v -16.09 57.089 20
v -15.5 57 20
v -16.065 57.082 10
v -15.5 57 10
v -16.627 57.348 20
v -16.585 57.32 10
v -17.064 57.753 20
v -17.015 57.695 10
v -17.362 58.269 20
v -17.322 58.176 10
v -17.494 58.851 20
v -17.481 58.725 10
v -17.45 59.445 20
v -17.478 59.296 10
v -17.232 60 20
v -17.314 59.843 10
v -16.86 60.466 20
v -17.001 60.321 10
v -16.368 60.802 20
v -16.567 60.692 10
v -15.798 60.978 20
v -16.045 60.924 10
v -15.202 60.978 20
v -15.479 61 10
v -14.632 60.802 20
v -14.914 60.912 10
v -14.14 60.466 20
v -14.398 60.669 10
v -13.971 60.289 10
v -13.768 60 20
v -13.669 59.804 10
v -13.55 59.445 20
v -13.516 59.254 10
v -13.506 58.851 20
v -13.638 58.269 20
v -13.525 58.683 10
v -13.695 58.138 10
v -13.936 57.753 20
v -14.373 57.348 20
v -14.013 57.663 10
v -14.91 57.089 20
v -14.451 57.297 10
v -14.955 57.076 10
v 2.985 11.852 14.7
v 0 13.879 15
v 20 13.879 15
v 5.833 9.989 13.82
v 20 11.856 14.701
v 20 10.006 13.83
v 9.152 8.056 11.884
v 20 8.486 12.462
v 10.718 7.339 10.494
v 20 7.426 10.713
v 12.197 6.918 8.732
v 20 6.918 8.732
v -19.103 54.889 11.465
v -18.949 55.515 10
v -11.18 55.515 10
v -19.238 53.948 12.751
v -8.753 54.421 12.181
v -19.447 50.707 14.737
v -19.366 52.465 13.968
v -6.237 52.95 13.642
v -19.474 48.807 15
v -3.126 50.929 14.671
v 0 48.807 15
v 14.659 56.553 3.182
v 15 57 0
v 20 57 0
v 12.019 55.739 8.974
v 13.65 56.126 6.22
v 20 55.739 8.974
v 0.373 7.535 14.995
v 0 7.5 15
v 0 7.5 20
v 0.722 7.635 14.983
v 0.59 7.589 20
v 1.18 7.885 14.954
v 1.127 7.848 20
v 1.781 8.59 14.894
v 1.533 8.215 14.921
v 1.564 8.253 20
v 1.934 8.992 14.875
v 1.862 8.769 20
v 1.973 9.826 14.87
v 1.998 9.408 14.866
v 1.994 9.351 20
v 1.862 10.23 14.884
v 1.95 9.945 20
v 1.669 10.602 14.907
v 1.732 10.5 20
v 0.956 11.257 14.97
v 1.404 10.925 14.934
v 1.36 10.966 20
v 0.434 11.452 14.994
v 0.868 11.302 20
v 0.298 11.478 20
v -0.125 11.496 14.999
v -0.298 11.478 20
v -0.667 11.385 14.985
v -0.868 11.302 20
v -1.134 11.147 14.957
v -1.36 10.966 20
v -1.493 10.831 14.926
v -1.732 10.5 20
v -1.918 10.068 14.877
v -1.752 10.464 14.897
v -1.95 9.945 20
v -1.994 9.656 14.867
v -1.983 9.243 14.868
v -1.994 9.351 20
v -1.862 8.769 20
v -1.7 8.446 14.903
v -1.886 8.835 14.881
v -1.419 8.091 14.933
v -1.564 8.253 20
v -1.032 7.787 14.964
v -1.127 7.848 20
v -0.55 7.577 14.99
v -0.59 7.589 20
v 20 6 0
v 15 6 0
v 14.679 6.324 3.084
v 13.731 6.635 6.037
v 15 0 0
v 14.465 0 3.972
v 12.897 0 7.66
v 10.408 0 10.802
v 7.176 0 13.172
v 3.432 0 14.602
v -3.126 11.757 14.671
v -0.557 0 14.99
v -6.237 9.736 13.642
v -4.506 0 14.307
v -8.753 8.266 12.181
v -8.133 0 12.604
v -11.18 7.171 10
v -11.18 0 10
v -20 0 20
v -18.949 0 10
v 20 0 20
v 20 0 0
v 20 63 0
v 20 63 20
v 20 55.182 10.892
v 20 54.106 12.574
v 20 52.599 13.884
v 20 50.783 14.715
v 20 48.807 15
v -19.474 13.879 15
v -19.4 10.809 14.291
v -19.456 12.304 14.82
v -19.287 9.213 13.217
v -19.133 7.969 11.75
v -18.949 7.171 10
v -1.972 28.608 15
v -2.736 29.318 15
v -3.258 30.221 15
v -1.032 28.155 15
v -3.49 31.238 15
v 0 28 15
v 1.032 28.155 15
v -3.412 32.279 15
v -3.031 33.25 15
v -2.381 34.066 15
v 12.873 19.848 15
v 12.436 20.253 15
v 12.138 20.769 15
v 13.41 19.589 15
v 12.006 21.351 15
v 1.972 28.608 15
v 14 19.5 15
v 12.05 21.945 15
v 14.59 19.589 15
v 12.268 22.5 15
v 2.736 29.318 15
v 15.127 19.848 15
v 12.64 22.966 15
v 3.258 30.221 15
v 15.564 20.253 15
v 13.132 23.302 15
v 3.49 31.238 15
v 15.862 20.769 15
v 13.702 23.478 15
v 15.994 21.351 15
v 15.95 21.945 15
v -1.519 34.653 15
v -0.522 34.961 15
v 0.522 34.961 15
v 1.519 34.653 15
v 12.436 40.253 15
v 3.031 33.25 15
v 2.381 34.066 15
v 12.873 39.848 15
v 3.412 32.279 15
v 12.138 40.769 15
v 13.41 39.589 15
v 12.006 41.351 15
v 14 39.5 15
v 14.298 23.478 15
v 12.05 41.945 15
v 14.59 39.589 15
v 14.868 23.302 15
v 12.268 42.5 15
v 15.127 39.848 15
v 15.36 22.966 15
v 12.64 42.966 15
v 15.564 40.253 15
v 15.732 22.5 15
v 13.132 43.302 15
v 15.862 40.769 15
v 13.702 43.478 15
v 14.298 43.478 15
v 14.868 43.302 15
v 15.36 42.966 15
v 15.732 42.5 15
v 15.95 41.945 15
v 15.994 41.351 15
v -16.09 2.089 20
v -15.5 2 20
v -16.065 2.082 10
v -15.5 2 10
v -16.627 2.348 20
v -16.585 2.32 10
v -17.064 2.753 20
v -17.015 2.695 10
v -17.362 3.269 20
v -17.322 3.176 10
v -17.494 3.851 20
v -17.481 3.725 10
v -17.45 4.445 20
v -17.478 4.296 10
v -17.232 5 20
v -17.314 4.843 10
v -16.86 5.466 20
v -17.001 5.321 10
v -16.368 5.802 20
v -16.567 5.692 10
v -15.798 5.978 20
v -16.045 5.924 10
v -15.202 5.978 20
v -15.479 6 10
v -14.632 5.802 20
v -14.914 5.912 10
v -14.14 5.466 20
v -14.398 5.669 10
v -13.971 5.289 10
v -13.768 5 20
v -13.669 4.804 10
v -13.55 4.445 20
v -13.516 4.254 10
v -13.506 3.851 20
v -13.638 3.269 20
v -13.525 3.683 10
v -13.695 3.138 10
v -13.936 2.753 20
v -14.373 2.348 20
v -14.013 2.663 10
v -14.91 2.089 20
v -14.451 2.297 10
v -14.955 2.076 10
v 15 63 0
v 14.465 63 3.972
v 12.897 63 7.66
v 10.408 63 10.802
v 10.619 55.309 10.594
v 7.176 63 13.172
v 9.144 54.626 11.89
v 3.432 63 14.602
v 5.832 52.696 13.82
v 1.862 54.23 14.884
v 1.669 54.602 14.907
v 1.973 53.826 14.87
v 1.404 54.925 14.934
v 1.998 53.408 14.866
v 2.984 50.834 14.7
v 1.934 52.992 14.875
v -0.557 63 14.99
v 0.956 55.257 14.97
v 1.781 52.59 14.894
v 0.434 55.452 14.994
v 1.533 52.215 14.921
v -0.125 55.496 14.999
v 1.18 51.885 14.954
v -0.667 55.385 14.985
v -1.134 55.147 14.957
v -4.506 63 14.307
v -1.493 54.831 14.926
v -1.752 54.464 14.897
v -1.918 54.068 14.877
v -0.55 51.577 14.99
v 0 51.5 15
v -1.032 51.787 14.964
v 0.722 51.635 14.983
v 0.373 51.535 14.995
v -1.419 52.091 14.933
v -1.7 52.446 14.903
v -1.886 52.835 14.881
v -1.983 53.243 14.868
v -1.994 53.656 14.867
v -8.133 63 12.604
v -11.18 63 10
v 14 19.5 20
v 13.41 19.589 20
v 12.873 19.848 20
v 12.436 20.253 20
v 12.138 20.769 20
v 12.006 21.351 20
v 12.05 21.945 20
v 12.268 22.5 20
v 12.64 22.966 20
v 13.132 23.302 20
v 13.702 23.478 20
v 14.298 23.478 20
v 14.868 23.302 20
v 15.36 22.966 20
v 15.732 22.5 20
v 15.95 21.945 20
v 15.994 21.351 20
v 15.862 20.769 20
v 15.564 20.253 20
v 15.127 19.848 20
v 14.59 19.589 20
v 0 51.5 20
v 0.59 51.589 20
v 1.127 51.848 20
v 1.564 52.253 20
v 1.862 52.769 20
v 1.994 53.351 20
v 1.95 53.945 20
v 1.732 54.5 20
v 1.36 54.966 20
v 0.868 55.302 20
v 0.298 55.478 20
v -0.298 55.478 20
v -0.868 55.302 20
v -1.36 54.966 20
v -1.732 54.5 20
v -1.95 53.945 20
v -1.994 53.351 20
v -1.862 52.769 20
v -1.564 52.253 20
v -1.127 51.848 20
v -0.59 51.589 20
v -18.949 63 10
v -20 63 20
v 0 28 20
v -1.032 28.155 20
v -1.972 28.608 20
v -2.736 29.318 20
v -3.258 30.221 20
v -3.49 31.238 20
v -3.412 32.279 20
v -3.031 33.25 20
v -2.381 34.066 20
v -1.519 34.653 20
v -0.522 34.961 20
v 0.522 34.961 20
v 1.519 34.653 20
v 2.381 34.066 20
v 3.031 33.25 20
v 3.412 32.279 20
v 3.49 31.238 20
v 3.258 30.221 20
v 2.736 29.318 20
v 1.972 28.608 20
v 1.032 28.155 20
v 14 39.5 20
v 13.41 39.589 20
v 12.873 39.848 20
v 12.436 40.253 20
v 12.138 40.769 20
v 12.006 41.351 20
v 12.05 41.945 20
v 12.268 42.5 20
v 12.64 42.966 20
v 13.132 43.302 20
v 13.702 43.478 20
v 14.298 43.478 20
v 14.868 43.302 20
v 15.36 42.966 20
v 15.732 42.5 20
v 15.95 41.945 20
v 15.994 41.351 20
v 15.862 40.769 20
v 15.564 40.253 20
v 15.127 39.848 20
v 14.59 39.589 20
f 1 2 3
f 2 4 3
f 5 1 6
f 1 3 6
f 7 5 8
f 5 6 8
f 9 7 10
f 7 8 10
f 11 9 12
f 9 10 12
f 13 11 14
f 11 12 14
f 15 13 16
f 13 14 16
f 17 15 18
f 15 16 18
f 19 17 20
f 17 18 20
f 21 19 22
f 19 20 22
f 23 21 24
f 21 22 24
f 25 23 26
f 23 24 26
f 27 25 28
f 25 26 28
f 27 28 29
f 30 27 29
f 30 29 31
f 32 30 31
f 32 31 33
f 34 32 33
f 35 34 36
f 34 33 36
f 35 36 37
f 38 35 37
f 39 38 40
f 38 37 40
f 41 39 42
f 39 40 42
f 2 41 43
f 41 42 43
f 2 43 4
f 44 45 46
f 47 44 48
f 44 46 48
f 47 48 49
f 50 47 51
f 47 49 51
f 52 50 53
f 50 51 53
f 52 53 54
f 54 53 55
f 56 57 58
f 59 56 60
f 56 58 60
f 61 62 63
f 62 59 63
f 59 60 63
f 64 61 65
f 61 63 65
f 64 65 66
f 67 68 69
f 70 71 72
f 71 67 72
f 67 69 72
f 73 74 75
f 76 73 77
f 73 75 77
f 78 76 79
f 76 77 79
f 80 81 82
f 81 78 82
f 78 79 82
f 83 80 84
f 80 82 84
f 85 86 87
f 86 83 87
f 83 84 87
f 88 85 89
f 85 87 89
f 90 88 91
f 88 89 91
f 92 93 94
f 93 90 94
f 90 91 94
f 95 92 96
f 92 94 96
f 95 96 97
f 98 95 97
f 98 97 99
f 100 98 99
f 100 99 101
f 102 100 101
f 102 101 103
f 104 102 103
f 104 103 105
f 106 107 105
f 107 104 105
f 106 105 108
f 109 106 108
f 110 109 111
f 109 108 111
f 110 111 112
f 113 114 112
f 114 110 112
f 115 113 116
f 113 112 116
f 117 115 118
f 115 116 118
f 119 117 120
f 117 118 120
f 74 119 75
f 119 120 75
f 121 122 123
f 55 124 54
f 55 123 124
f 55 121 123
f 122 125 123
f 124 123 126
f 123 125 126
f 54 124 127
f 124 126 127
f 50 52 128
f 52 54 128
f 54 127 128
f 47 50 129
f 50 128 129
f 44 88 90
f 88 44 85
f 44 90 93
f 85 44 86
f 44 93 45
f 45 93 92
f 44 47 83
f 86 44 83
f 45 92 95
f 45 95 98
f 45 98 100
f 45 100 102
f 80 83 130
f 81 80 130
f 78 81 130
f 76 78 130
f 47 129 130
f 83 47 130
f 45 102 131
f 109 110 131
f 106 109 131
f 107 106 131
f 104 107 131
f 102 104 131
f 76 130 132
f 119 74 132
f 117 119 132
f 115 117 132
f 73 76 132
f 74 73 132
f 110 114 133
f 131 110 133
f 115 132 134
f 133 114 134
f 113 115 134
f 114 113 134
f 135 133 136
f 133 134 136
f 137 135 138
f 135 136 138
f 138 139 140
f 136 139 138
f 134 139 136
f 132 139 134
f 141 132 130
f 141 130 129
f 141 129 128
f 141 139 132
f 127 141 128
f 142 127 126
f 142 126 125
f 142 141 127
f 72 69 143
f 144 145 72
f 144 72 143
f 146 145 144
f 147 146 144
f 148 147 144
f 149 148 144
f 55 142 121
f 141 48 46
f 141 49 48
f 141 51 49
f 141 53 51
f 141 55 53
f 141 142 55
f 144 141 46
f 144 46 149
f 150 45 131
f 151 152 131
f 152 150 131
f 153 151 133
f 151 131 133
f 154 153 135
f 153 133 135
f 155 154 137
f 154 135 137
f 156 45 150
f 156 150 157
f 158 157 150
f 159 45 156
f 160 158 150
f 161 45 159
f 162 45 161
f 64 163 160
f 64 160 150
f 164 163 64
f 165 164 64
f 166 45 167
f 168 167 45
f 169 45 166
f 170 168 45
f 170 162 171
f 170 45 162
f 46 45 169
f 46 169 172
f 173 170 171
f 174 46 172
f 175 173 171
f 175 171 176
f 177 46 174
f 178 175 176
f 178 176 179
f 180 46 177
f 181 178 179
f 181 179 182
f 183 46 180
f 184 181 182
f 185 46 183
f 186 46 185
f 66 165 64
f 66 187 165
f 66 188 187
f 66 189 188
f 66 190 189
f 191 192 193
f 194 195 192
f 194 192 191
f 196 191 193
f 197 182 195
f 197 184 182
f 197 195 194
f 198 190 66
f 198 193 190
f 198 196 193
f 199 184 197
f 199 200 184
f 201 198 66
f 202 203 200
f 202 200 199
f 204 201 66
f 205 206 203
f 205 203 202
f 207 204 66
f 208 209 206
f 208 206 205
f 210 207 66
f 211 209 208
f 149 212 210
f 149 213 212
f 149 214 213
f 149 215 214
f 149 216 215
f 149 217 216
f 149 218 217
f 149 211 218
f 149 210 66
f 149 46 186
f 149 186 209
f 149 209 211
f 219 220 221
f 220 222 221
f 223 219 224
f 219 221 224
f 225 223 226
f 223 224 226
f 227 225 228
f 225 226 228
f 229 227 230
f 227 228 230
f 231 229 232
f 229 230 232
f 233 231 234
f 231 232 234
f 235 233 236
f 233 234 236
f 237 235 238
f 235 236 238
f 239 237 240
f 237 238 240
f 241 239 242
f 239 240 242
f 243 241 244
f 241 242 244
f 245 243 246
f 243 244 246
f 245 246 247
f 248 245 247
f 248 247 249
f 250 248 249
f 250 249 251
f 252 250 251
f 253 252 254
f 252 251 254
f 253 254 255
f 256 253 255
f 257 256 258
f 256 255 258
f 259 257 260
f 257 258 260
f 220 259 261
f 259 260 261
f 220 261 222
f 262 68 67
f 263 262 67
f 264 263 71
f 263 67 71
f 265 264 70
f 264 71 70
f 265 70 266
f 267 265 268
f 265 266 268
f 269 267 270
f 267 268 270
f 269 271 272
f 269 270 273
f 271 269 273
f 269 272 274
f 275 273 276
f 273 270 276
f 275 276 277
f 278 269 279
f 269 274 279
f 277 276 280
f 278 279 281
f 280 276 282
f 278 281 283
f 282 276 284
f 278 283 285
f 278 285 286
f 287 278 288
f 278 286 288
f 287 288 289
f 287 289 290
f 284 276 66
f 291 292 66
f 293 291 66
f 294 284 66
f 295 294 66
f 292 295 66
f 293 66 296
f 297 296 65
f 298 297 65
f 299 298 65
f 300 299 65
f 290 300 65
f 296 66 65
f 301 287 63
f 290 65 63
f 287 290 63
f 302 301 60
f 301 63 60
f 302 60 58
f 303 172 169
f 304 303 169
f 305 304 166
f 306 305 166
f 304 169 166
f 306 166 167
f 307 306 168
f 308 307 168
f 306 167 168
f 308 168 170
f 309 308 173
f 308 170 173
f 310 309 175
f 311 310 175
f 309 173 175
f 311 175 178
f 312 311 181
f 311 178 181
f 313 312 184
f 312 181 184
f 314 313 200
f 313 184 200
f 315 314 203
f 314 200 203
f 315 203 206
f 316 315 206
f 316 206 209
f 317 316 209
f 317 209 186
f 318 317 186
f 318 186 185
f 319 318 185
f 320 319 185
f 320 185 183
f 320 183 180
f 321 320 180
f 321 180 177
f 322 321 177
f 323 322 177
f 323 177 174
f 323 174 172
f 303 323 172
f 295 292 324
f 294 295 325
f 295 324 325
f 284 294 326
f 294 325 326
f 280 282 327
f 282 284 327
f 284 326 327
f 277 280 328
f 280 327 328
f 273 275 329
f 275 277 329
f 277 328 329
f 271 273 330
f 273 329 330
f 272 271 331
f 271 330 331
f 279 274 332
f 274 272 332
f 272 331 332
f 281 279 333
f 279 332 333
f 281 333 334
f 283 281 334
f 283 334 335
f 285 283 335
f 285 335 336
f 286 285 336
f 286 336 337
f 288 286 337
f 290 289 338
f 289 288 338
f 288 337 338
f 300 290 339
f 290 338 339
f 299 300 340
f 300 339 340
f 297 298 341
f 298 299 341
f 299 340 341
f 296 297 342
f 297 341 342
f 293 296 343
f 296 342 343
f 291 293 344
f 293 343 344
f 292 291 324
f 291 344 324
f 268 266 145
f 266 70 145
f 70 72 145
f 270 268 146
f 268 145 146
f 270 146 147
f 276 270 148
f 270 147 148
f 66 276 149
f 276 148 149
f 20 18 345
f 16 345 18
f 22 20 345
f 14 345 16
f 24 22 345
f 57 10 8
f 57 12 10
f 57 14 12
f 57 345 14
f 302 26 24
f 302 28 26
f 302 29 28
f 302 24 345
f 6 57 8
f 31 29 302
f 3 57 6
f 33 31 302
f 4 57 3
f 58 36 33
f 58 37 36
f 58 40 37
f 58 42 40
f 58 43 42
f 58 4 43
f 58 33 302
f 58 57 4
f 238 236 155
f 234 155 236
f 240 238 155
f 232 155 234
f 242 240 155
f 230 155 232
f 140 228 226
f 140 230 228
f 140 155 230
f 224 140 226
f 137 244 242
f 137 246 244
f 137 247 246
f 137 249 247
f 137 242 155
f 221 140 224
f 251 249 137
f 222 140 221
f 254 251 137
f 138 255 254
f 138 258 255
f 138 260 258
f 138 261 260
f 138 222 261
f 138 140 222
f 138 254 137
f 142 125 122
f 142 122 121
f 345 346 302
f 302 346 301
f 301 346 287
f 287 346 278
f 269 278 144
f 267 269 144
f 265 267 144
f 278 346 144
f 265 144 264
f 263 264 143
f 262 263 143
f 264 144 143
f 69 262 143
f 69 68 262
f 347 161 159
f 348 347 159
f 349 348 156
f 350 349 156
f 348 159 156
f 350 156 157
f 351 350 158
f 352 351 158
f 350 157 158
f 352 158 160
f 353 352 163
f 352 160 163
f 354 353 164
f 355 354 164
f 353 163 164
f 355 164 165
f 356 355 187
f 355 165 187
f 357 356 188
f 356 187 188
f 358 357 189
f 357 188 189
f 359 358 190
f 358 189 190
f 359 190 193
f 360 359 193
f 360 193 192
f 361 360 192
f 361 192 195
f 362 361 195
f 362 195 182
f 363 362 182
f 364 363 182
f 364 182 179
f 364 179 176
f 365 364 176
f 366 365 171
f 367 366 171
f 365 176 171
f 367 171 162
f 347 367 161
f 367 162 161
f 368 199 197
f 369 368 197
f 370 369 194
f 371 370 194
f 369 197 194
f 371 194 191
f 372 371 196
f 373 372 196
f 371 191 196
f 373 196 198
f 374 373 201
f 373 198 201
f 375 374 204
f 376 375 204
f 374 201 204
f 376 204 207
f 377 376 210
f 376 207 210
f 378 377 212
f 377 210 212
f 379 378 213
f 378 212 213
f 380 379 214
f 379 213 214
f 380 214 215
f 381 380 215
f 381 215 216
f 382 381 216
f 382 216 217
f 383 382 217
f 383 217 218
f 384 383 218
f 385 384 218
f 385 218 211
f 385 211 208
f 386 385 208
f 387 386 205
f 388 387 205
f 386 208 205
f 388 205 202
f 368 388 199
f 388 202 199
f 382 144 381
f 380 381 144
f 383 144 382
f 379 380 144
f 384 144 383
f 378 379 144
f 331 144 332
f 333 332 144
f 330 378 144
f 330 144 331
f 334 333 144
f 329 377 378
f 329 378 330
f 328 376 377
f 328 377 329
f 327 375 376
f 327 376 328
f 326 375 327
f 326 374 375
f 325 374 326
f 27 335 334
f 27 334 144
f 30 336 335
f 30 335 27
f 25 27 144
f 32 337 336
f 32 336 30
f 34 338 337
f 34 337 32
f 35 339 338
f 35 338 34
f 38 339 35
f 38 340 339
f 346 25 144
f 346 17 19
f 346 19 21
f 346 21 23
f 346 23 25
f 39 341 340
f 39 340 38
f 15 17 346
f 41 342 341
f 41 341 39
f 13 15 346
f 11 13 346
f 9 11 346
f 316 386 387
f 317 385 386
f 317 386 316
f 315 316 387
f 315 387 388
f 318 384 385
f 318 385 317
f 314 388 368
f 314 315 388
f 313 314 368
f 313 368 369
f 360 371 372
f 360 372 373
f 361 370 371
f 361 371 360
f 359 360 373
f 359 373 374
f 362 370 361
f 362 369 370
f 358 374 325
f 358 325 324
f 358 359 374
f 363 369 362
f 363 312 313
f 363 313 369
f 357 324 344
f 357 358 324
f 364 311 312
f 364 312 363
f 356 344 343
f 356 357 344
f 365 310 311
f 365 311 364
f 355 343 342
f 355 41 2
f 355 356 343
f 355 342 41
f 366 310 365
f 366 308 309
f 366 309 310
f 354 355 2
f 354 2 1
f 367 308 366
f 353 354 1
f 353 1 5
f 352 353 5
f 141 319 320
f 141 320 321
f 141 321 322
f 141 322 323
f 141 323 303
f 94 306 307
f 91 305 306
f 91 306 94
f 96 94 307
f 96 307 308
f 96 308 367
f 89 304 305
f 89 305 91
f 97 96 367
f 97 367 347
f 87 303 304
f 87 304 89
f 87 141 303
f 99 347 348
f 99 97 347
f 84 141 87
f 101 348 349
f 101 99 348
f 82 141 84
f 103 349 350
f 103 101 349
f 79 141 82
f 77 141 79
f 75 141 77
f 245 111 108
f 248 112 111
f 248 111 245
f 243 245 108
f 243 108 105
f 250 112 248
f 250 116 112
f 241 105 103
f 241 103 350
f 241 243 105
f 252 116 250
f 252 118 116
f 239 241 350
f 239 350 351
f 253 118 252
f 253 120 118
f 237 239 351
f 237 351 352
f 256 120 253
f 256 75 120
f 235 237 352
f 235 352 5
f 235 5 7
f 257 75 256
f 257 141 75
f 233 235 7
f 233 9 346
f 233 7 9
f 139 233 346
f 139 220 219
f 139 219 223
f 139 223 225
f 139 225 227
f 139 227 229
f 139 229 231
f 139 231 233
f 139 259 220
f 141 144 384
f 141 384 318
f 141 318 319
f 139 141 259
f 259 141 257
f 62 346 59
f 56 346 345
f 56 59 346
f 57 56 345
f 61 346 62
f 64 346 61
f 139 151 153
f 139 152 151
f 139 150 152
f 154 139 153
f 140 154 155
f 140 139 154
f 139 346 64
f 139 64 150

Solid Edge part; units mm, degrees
sketch "Sketch1" plane through (0, 0, 0) normal (0, -1, 0) x (1, 0, 0)
  line L0 (20, 20) -> (-20, 20)
  line L1 (-20, 20) -> (-18.949, 10)
  line L2 (-18.949, 10) -> (-11.1803, 10)
  line L3 (15, 0) -> (20, 0)
  line L4 (20, 0) -> (20, 20)
  arc A0 (-11.1803, 10) -> (15, 0) centre (0, 0) cw
extrude "Protrusion1" add sketch "Sketch1" against normal blind 63
sketch "Sketch2" plane through (20, 31.5, 10) normal (1, 0, 0) x (0, 1, 0)
  line L0 (31.5, -10) -> (25.5, -10)
  line L1 (25.5, -10) -> (24.2388, -1.0258)
  arc A0 (17.3069, 5) -> (24.2388, -1.0258) centre (17.3069, -2) cw
  line L2 (0, 5) -> (17.3069, 5)
  line L3 (0, 5) -> (-17.6206, 5)
  arc A1 (-17.6206, 5) -> (-24.5823, -1.2683) centre (-17.6206, -2) ccw
  line L4 (-25.5, -10) -> (-24.5823, -1.2683)
  line L5 (-31.5, -10) -> (-25.5, -10)
extrude "Recorte_Extrudado_1" cut sketch "Sketch2" against normal blind 40 material side at (20, 60, -0.05)
hole "Furo_1" at (14, 21.5, 20) direction (0, 0, -1) diameter 4 depth 10
hole "Hole1" at (14, 41.5, 20) direction (0, 0, -1) diameter 4 depth 10
hole "Hole2" at (-15.5, 4, 20) direction (0, 0, -1) diameter 4 depth 10
hole "Hole3" at (-15.5, 59, 20) direction (0, 0, -1) diameter 4 depth 10
hole "Furo_8" at (0, 31.5, 20) direction (0, 0, -1) diameter 7 depth 10
hole "Furo_9" at (0, 9.5, 20) direction (0, 0, -1) diameter 4 end up to next
hole "Hole4" at (0, 53.5, 20) direction (0, 0, -1) diameter 4 end up to next
properties material "PVC"
